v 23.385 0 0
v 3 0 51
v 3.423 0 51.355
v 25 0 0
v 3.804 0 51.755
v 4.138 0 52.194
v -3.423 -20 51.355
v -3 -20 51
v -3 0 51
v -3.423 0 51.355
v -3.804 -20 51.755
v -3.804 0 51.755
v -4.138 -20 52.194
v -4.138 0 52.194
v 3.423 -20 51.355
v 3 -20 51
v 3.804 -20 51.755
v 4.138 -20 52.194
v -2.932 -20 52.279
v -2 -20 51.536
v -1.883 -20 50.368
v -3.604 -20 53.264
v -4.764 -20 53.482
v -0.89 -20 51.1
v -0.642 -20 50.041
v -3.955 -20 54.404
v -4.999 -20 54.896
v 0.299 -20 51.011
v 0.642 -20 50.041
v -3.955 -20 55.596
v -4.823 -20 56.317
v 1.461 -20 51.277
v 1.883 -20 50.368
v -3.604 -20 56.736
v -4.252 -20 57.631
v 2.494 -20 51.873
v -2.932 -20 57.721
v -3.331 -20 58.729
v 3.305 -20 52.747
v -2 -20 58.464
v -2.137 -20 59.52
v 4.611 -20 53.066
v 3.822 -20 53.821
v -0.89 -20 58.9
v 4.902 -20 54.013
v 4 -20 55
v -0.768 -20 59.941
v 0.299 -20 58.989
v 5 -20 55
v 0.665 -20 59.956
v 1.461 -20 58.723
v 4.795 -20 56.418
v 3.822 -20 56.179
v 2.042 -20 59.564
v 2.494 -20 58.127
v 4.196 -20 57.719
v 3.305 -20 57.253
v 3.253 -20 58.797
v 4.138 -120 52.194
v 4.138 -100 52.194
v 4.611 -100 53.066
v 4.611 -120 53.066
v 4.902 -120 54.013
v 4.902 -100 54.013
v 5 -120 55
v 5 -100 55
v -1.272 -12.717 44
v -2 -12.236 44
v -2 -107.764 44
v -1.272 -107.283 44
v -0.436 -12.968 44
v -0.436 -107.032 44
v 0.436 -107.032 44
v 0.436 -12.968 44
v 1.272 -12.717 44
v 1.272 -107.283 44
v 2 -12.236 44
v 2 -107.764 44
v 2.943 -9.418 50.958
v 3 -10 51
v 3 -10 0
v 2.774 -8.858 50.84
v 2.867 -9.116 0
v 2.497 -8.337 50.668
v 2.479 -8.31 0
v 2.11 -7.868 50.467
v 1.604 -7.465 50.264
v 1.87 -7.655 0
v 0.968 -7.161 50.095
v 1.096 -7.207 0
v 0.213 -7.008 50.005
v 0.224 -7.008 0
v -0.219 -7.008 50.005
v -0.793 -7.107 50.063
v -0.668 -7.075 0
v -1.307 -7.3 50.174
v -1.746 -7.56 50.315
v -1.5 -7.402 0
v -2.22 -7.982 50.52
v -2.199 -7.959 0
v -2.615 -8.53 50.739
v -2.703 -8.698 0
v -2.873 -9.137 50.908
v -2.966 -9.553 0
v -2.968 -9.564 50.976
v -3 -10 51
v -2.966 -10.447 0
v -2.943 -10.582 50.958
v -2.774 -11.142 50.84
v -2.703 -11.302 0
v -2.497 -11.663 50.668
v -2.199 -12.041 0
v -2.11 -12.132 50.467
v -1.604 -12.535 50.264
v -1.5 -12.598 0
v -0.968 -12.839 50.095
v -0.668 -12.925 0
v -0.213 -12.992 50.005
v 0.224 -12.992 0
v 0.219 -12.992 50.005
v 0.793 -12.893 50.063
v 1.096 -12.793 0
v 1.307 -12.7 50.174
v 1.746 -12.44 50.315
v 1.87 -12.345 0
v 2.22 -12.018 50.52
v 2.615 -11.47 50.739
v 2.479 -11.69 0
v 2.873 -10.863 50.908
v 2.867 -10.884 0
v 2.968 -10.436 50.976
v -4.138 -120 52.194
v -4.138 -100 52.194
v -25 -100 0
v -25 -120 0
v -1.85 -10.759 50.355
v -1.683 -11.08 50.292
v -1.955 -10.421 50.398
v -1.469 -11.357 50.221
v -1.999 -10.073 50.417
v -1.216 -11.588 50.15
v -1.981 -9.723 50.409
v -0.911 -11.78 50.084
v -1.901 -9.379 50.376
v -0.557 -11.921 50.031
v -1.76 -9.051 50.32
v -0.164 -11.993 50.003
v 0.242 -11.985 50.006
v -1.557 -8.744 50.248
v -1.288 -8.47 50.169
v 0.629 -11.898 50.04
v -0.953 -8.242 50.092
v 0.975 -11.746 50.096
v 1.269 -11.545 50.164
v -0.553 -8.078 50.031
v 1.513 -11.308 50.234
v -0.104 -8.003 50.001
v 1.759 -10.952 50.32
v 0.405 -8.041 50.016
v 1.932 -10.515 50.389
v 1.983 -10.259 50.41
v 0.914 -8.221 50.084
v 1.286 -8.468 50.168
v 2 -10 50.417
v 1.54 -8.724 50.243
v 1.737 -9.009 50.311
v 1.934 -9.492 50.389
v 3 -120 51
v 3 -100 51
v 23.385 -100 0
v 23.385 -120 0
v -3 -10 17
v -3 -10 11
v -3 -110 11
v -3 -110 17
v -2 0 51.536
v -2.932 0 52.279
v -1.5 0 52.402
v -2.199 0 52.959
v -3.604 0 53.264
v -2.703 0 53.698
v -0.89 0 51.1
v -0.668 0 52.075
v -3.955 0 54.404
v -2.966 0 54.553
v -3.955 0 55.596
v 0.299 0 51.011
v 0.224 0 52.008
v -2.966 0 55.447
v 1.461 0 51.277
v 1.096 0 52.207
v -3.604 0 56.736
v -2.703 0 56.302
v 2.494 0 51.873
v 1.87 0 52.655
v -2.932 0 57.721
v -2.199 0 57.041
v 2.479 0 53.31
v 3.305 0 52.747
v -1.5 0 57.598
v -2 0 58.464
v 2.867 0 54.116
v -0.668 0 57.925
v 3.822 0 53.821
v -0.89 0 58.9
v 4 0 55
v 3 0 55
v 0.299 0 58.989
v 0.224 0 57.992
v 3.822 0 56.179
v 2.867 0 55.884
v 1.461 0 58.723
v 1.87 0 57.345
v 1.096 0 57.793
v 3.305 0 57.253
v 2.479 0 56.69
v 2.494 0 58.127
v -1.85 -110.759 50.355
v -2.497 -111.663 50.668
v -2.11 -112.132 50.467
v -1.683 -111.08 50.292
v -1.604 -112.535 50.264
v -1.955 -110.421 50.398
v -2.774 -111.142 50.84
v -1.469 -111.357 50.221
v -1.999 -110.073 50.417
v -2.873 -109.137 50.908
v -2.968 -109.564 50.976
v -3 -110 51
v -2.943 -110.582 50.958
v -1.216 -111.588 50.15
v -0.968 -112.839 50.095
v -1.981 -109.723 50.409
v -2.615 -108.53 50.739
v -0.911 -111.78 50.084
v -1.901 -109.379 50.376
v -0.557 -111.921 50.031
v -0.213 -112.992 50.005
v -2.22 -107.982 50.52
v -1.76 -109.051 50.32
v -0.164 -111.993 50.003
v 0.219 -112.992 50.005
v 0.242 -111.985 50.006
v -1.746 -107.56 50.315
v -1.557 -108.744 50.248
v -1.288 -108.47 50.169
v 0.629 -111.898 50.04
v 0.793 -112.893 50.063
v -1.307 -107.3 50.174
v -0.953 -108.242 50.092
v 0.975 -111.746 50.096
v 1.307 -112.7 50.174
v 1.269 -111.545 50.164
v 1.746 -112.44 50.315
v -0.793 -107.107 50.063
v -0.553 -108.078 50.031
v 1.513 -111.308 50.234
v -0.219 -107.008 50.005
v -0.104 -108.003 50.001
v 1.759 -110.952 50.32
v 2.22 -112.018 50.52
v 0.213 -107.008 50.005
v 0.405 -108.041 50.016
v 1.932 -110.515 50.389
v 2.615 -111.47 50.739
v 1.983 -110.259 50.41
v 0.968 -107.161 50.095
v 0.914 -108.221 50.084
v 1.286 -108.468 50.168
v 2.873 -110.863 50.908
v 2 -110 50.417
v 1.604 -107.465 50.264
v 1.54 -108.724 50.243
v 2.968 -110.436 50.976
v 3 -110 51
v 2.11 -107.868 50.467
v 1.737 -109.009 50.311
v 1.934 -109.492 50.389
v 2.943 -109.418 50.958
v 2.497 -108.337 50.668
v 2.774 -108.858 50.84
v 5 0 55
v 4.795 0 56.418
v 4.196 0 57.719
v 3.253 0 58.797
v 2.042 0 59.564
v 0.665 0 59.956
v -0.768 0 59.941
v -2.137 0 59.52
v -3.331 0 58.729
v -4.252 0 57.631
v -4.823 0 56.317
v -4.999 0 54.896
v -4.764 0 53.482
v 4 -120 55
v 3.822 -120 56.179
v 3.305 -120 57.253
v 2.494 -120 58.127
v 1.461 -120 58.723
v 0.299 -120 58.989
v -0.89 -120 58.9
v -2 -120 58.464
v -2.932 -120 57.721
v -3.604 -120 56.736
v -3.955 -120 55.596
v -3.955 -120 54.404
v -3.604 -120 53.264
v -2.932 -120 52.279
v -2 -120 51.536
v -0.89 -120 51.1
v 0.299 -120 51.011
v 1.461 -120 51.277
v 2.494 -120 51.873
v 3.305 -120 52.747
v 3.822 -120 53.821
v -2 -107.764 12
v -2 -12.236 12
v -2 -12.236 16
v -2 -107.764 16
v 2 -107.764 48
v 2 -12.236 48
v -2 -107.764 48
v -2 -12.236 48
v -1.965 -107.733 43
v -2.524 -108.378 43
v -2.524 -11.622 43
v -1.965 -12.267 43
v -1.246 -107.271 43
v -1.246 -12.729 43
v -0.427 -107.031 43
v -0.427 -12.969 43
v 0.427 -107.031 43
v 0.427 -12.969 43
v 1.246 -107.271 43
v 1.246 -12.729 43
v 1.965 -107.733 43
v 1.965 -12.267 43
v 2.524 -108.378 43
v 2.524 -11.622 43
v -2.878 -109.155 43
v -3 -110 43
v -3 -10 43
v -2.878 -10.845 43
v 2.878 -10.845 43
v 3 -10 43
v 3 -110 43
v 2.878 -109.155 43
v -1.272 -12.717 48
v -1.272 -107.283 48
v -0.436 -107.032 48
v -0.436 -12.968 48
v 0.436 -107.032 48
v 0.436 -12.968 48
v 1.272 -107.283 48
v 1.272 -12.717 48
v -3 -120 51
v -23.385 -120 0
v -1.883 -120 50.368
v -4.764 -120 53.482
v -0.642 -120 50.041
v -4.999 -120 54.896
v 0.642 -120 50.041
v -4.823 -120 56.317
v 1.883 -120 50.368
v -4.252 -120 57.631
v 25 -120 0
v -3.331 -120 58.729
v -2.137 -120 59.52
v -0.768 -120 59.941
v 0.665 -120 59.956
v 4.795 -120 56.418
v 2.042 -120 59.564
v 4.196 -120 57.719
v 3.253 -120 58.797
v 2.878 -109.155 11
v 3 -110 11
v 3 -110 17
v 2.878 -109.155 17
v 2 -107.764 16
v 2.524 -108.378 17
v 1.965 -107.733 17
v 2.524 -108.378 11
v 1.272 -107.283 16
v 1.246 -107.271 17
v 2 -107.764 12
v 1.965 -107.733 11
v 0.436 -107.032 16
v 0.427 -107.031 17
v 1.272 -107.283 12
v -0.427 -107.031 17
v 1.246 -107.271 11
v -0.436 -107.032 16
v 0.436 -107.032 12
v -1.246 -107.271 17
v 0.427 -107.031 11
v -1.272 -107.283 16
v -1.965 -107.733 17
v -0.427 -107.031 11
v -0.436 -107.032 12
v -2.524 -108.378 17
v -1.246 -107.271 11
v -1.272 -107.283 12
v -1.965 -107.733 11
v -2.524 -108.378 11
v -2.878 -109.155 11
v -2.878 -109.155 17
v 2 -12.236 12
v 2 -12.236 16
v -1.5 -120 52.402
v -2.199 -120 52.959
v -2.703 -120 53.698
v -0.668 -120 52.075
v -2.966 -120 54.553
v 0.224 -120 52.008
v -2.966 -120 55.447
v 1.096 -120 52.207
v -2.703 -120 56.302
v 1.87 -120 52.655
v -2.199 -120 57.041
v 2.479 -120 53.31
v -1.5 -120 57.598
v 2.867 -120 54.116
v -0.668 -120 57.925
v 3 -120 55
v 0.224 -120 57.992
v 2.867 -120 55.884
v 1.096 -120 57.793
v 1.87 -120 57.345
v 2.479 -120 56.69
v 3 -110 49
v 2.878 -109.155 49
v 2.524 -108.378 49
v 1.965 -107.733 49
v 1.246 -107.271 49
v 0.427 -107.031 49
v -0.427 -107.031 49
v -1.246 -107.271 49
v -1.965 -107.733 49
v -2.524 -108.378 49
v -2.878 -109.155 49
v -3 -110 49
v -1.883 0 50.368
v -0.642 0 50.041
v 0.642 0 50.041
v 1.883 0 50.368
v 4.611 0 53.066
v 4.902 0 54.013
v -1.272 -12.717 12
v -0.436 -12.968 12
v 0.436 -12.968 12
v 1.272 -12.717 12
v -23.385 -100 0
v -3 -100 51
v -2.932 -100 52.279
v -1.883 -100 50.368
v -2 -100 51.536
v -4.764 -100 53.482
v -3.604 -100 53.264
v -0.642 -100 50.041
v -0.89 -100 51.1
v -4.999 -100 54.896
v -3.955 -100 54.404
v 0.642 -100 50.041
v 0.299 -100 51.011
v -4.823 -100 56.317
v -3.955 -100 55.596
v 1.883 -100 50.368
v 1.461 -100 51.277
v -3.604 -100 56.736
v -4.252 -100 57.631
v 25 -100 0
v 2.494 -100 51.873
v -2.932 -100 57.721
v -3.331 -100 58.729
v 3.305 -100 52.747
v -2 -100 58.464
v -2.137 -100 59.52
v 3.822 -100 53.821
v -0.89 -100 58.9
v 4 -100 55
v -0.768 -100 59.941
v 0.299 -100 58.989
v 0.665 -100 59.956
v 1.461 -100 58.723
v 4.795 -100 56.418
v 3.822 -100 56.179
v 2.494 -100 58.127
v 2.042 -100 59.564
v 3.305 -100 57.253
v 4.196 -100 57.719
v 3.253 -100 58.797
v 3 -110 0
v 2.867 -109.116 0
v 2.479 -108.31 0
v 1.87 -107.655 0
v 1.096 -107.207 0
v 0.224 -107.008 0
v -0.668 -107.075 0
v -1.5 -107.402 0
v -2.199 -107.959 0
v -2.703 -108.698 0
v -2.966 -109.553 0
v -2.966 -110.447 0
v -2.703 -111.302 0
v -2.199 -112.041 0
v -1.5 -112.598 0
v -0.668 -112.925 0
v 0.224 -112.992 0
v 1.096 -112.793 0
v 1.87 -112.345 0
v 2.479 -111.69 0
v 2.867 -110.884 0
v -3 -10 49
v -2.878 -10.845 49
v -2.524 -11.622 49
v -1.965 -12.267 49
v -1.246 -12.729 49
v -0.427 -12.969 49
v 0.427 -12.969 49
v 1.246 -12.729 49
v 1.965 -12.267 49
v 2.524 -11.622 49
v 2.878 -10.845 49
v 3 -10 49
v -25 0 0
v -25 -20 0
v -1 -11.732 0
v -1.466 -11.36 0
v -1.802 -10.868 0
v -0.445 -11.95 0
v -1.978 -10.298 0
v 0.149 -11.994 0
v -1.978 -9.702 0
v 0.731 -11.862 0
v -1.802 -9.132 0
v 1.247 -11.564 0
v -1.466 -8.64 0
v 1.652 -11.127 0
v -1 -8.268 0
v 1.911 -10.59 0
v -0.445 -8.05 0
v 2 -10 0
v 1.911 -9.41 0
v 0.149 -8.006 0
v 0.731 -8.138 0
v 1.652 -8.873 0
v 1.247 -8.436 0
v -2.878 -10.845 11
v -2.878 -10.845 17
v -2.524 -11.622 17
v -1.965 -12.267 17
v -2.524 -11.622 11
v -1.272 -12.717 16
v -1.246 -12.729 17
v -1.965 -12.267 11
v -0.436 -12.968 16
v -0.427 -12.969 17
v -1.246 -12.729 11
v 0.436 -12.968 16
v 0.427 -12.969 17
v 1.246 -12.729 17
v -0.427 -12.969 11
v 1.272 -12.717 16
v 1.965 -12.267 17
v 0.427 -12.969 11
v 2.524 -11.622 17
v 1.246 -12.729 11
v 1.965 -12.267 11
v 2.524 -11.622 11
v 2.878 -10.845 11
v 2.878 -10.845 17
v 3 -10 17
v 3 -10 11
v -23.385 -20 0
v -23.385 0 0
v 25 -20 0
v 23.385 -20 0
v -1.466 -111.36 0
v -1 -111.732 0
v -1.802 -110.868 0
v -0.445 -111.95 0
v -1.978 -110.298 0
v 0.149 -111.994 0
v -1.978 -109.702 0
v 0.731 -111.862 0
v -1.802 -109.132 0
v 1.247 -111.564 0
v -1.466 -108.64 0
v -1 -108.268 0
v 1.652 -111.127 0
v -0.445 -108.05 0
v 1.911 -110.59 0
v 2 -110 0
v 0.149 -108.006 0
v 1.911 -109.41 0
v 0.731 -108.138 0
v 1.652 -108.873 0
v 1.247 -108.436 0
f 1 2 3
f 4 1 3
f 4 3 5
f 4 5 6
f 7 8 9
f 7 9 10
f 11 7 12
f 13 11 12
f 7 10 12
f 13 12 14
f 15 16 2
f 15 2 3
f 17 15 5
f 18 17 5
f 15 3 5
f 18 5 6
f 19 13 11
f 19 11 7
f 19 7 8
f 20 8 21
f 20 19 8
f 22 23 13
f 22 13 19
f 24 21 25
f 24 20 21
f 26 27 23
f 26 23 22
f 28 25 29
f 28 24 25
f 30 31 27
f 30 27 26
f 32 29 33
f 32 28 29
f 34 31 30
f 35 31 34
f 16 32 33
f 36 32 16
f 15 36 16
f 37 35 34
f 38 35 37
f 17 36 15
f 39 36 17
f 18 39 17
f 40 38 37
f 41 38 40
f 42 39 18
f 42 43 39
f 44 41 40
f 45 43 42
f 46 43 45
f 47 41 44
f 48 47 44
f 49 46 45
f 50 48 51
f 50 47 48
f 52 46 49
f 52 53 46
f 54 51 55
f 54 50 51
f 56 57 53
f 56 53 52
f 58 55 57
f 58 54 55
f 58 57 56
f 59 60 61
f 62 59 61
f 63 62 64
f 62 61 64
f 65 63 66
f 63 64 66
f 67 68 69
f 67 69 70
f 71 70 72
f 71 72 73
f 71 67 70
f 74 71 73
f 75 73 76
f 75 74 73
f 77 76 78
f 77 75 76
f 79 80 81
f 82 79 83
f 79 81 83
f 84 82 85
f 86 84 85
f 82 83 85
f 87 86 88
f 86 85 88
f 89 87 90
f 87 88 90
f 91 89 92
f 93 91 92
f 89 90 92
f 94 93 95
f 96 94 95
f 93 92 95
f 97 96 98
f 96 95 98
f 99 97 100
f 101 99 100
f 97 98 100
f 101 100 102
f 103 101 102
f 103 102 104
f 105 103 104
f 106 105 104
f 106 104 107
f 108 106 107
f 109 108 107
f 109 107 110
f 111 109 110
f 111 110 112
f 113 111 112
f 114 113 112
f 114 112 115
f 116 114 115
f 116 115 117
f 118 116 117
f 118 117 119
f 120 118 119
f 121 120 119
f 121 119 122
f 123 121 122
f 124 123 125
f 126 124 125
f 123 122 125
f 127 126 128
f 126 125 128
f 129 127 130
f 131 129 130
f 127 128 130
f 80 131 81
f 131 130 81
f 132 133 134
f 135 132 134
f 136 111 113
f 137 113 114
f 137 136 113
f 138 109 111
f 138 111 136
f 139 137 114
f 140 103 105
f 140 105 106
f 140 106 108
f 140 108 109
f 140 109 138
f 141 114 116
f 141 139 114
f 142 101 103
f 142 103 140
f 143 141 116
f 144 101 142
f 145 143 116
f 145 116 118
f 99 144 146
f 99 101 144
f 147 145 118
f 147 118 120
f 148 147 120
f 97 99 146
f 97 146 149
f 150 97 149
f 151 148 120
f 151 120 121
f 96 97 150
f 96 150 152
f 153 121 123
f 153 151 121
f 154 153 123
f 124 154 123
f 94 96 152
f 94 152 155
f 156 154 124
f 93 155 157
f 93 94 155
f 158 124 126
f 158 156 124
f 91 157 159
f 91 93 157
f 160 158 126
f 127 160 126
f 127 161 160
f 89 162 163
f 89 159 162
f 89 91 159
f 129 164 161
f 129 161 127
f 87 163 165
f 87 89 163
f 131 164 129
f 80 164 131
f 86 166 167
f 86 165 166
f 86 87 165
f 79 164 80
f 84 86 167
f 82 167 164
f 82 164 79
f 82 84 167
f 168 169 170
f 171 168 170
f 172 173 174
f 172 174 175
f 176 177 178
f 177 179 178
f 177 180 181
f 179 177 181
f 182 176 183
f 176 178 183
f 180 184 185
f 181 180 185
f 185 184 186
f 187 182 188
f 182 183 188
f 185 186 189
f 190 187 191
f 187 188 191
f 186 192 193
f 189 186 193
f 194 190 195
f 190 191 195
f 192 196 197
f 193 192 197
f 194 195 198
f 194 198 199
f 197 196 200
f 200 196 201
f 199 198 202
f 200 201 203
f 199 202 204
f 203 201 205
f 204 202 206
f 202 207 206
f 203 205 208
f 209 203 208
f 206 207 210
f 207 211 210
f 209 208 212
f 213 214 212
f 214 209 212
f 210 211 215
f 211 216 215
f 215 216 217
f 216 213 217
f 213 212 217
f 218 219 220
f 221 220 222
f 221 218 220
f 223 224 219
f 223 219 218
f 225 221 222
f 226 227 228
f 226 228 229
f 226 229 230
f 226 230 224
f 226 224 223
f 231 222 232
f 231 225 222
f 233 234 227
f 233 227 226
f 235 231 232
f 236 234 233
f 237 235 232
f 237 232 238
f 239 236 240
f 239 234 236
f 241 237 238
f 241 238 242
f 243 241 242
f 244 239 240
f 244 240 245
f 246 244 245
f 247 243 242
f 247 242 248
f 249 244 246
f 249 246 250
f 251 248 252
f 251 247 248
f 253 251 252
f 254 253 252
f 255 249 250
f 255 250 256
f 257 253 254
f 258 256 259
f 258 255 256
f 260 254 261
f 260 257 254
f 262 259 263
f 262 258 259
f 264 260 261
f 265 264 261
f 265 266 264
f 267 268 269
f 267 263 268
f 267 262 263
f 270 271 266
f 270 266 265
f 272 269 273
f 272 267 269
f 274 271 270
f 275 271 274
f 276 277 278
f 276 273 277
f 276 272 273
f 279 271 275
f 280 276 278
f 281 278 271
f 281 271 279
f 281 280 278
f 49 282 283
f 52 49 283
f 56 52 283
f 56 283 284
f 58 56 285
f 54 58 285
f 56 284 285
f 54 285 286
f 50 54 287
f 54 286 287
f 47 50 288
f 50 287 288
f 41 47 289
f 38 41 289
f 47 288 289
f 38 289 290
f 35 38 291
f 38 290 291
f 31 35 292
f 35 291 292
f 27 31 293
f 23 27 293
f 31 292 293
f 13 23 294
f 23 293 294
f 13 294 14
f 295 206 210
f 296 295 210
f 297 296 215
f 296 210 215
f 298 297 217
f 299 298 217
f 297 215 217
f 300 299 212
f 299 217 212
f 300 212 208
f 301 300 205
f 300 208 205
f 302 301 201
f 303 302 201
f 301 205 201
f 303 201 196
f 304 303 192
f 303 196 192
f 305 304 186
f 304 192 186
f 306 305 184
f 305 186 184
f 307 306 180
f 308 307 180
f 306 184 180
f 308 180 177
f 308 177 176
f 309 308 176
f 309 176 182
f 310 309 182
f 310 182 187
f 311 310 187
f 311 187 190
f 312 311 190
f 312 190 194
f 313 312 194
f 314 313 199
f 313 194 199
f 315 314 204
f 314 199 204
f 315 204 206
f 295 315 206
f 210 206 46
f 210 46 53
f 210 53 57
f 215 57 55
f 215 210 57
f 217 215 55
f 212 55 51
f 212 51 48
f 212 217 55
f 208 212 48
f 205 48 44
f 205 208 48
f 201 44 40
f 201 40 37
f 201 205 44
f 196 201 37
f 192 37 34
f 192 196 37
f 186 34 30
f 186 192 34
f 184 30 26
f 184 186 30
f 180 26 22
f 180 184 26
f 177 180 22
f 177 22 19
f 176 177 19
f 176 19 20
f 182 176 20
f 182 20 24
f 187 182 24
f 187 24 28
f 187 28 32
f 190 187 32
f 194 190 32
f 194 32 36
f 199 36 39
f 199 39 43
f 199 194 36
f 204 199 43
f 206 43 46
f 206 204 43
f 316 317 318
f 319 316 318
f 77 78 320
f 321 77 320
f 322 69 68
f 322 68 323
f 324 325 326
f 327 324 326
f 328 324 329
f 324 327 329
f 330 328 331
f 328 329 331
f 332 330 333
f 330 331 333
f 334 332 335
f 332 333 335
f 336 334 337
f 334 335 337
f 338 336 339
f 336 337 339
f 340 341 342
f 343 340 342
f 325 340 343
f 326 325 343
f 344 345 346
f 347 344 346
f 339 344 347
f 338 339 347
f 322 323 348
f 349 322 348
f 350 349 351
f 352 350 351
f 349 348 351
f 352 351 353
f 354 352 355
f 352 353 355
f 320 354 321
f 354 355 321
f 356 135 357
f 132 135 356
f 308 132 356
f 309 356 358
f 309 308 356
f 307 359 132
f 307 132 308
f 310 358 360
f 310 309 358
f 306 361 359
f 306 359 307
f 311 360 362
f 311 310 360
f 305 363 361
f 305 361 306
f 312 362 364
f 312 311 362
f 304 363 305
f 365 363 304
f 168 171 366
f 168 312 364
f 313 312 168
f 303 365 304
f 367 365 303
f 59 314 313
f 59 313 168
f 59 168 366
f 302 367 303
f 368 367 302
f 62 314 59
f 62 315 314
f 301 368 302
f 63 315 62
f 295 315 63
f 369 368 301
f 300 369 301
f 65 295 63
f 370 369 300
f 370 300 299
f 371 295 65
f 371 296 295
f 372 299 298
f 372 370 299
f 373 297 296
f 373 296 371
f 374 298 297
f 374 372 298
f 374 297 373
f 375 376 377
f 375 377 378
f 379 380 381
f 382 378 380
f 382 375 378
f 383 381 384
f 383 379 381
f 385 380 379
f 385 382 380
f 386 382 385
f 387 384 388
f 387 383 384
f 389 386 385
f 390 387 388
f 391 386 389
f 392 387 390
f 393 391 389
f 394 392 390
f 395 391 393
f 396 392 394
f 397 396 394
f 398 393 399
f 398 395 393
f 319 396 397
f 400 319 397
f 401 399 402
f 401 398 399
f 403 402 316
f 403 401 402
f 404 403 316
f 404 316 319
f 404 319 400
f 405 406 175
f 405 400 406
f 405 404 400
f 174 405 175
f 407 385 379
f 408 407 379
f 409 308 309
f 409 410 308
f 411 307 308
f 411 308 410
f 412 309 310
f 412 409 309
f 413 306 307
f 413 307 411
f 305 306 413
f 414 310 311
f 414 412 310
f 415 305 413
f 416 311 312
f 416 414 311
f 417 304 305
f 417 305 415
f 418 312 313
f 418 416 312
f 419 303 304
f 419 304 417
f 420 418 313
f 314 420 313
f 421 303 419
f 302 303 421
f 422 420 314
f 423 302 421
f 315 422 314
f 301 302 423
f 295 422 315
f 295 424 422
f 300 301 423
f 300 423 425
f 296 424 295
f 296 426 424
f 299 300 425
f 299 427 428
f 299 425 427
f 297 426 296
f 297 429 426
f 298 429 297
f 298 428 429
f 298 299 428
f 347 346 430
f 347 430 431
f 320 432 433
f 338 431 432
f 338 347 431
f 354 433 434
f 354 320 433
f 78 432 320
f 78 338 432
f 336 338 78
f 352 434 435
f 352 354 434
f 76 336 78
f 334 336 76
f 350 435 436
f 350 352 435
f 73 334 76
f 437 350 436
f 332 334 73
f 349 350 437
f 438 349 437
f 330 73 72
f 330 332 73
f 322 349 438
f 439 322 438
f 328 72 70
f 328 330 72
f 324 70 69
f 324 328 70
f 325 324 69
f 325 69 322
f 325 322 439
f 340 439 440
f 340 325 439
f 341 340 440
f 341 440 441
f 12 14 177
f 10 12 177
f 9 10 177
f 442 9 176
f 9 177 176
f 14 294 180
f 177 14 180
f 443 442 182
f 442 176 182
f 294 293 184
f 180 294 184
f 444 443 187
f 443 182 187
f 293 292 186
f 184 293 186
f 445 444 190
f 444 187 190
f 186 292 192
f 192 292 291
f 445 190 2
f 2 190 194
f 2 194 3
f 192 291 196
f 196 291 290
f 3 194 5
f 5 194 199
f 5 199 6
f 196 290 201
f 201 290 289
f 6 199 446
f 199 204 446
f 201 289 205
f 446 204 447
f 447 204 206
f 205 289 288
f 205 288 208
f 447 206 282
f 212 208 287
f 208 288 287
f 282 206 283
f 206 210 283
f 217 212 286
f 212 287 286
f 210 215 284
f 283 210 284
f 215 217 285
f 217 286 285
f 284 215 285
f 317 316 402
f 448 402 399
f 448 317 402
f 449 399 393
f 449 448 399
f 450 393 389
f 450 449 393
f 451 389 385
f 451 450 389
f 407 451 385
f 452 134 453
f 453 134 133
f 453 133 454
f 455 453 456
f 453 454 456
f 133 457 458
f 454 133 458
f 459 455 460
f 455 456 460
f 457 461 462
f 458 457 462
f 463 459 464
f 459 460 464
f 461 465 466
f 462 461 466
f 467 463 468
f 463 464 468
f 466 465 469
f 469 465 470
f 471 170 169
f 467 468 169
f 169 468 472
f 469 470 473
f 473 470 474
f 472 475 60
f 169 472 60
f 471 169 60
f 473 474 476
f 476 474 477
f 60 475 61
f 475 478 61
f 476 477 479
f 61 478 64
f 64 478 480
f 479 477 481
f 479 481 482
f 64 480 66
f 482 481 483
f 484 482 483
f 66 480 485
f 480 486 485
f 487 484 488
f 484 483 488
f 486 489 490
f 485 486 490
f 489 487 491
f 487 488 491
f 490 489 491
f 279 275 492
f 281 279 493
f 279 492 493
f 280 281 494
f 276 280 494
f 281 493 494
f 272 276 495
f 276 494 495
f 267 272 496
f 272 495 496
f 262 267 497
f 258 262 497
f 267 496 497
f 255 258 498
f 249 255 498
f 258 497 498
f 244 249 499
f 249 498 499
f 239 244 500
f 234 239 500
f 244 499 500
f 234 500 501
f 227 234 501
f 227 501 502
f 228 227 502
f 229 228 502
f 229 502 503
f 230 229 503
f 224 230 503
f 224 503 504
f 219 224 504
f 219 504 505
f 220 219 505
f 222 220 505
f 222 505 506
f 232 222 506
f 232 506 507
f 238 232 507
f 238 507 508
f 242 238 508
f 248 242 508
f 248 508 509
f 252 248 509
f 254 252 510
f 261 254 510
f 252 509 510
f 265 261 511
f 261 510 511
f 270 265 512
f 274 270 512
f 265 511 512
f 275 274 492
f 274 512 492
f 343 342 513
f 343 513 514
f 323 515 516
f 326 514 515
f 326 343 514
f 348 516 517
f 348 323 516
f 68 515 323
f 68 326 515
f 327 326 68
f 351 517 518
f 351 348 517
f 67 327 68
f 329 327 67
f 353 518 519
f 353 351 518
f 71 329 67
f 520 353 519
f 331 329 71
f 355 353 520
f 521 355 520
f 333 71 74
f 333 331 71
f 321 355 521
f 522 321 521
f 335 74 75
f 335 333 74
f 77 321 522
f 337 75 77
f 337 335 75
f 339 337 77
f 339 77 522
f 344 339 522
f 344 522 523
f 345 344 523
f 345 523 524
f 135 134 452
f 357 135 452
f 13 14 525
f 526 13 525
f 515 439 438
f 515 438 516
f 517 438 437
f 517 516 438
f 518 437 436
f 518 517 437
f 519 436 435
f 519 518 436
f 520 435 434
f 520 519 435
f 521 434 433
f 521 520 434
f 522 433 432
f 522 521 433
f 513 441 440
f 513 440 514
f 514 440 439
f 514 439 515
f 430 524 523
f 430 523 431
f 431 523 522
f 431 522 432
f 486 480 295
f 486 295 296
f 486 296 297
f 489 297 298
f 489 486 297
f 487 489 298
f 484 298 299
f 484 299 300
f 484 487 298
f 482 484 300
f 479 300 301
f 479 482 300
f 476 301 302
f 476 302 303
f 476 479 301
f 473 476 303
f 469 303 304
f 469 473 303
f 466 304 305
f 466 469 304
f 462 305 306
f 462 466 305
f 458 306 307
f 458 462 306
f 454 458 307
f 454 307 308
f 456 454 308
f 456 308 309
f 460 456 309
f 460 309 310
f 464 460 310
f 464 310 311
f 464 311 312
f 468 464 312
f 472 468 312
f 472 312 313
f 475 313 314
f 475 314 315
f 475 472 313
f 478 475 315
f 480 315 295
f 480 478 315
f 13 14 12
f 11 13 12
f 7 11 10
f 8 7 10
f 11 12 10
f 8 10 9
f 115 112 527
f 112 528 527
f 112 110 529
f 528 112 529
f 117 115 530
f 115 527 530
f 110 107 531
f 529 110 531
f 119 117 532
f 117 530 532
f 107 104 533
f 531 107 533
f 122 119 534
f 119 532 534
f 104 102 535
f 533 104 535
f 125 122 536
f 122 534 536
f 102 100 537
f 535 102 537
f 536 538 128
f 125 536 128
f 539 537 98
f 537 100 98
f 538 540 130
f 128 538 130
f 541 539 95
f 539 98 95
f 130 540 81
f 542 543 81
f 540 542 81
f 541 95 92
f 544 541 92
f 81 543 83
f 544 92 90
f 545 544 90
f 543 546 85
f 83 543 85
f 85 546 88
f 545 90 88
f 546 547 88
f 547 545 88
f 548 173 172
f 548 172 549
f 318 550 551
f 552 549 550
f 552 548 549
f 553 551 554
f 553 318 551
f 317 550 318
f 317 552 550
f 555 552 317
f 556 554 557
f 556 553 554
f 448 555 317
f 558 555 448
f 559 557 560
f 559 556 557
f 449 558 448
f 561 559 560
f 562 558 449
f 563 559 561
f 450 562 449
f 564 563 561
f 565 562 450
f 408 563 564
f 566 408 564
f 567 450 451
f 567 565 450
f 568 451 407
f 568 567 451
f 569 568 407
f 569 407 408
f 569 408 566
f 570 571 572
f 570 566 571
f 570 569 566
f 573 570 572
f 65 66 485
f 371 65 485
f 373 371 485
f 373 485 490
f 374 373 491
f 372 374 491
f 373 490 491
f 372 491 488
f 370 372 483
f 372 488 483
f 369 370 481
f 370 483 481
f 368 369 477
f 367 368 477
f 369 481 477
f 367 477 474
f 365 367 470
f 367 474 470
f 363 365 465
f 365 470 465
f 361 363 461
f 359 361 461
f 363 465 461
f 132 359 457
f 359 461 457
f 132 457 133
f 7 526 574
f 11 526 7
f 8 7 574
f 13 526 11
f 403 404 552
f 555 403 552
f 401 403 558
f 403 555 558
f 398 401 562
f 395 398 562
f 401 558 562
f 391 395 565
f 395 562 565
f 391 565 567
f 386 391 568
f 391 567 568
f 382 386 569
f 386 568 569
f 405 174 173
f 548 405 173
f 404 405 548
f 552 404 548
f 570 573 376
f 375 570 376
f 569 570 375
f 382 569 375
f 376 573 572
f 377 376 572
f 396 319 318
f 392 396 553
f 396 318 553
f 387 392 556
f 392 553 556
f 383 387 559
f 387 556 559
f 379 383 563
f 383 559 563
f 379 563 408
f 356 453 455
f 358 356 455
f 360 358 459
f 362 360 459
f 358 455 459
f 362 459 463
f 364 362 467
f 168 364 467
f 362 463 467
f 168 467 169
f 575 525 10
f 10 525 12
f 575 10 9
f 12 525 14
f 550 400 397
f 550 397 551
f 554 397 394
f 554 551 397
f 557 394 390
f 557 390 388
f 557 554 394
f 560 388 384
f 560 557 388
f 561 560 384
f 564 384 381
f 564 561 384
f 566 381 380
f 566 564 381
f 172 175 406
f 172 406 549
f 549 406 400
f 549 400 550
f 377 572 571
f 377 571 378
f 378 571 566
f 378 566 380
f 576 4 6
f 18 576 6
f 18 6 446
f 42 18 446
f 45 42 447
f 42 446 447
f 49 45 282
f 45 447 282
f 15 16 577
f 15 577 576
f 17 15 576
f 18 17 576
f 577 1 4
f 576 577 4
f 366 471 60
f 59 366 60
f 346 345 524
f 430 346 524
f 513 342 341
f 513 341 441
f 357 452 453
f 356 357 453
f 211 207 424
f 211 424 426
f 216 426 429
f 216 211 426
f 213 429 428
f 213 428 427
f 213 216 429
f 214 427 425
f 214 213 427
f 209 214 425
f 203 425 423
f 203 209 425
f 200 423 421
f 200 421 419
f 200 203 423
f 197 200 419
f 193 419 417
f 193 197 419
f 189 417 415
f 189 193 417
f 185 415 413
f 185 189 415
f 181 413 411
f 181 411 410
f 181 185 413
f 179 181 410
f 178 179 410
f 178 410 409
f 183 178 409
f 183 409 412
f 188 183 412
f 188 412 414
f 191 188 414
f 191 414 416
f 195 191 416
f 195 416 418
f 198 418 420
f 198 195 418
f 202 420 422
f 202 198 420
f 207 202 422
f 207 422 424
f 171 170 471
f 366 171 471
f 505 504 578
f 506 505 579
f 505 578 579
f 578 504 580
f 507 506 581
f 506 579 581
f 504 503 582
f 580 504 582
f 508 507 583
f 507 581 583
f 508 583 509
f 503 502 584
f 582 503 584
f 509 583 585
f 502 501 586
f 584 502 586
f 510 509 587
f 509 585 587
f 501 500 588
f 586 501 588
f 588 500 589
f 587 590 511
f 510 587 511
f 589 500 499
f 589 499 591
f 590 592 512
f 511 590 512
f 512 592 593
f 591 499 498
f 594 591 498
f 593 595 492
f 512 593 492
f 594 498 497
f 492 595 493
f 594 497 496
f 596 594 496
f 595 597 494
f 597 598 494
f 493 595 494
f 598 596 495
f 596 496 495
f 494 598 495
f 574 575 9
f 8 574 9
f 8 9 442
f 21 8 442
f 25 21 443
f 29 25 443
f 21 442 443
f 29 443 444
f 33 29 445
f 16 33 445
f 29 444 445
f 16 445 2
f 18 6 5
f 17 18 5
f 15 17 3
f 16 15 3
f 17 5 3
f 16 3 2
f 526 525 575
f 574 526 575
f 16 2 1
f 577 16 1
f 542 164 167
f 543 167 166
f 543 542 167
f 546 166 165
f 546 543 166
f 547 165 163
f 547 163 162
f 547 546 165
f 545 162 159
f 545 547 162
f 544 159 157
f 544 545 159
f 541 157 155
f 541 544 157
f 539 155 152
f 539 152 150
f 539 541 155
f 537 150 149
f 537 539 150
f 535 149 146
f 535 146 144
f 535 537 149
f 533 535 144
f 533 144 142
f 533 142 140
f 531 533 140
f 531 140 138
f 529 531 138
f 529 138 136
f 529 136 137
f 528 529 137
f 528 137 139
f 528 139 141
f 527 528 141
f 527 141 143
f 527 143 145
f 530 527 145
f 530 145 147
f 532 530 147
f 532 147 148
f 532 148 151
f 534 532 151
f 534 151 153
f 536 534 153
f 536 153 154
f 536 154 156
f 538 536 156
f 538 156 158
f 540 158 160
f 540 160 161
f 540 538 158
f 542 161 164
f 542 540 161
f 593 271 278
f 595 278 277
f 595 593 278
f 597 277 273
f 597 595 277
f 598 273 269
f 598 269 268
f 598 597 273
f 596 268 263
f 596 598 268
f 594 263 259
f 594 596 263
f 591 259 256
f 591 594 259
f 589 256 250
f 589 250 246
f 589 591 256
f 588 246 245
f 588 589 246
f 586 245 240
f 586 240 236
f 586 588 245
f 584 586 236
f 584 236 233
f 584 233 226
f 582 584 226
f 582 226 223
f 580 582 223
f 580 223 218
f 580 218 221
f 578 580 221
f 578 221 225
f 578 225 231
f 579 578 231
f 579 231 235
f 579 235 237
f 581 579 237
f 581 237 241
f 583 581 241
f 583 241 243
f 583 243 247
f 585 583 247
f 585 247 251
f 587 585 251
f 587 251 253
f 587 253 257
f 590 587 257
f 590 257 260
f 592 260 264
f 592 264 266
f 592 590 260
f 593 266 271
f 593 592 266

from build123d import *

# Parameters (mm, degrees)
F2_DEPTH = 20
F3_START = 10
F1_W     = 6
F1_H     = 6
F1_W_2   = 4
F1_H_2   = 4
F3_DEPTH = 100
F0_R     = 3
F0_R_2   = 2
F4_DEPTH = 50
F5_DEPTH = 55
F1_R     = 4
F1_R_2   = 3
F6_DEPTH = 120
F7_DEPTH = 20
F8_START = 100
F8_DEPTH = 20
F9_DEPTH = 120


with BuildPart() as f2:
    # F1 (on Front) → F2 (new body)
    with BuildSketch(Plane.XZ):
        with BuildLine():
            ThreePointArc((-3, 51), (-3.6186841703, 51.5496196043), (-4.1382378442, 52.1937591792))
            Line((-4.1382378442, 52.1937591792), (-25, 0))
            Line((-25, 0), (-23.3846185191, 0))
            Line((-23.3846185191, 0), (-3, 51))
        make_face()
    extrude(amount=F2_DEPTH)


with BuildPart() as f2b:
    # F1 (on Front) → F2, piece 2 (new body)
    with BuildSketch(Plane.XZ):
        with BuildLine():
            Line((25, 0), (4.1382378442, 52.1937591792))
            ThreePointArc((4.1382378442, 52.1937591792), (3.6186841703, 51.5496196043), (3, 51))
            Line((3, 51), (23.3846185191, 0))
            Line((23.3846185191, 0), (25, 0))
        make_face()
    extrude(amount=F2_DEPTH)


with BuildPart() as f3:
    # F1 (on Front) → F3 (new body)
    with BuildSketch(Plane.XZ.offset(F3_START)):
        with Locations((0, 46)):
            Rectangle(F1_W, F1_H)
        with Locations((0, 46)):
            Rectangle(F1_W_2, F1_H_2, mode=Mode.SUBTRACT)
    extrude(amount=F3_DEPTH)


with BuildPart() as f3b:
    # F1 (on Front) → F3, piece 2 (new body)
    with BuildSketch(Plane.XZ.offset(F3_START)):
        with Locations((-2.61e-08, 14)):
            Rectangle(F1_W, F1_H)
        with Locations((-2.61e-08, 14)):
            Rectangle(F1_W_2, F1_H_2, mode=Mode.SUBTRACT)
    extrude(amount=F3_DEPTH)


with BuildPart() as f4_tool:
    # F0 (on Top) → F4 (new body)
    with BuildSketch(Plane.XY):
        with Locations((0, -10)):
            Circle(F0_R)
        with Locations((0, -10)):
            Circle(F0_R_2, mode=Mode.SUBTRACT)
        with Locations((0, -110)):
            Circle(F0_R)
        with Locations((0, -110)):
            Circle(F0_R_2, mode=Mode.SUBTRACT)
        with Locations((0, -10)):
            Circle(F0_R_2)
        with Locations((0, -110)):
            Circle(F0_R_2)
    extrude(amount=F4_DEPTH)


with BuildPart() as f3_1:
    add(f3.part)

    # F4: cut by f4_tool
    add(f4_tool.part, mode=Mode.SUBTRACT)


with BuildPart() as f3b_1:
    add(f3b.part)

    # F4: cut by f4_tool
    add(f4_tool.part, mode=Mode.SUBTRACT)


with BuildPart() as f5:
    # F0 (on Top) → F5 (new body)
    with BuildSketch(Plane.XY):
        with Locations((0, -10)):
            Circle(F0_R)
        with Locations((0, -10)):
            Circle(F0_R_2, mode=Mode.SUBTRACT)
    extrude(amount=F5_DEPTH)


with BuildPart() as f5b:
    # F0 (on Top) → F5, piece 2 (new body)
    with BuildSketch(Plane.XY):
        with Locations((0, -110)):
            Circle(F0_R)
        with Locations((0, -110)):
            Circle(F0_R_2, mode=Mode.SUBTRACT)
    extrude(amount=F5_DEPTH)


with BuildPart() as f6_tool:
    # F1 (on Front) → F6 (new body)
    with BuildSketch(Plane.XZ):
        with BuildLine():
            ThreePointArc((4.1382378442, 52.1937591792), (4.7797065402, 53.5322107135), (5, 55))
            ThreePointArc((5, 55), (-1.4677892865, 59.7797065402), (-4.1382378442, 52.1937591792))
            ThreePointArc((-4.1382378442, 52.1937591792), (-3.6186841703, 51.5496196043), (-3, 51))
            ThreePointArc((-3, 51), (0, 50), (3, 51))
            ThreePointArc((3, 51), (3.6186841703, 51.5496196043), (4.1382378442, 52.1937591792))
        make_face()
        with Locations((0, 55)):
            Circle(F1_R, mode=Mode.SUBTRACT)
        with Locations((0, 55)):
            Circle(F1_R)
        with Locations((0, 55)):
            Circle(F1_R_2, mode=Mode.SUBTRACT)
        with Locations((0, 55)):
            Circle(F1_R_2)
    extrude(amount=F6_DEPTH)


with BuildPart() as f5_1:
    add(f5.part)

    # F6: cut by f6_tool
    add(f6_tool.part, mode=Mode.SUBTRACT)


with BuildPart() as f5b_1:
    add(f5b.part)

    # F6: cut by f6_tool
    add(f6_tool.part, mode=Mode.SUBTRACT)


with BuildPart() as f7:
    # F1 (on Front) → F7 (new body)
    with BuildSketch(Plane.XZ):
        with BuildLine():
            ThreePointArc((4.1382378442, 52.1937591792), (4.7797065402, 53.5322107135), (5, 55))
            ThreePointArc((5, 55), (-1.4677892865, 59.7797065402), (-4.1382378442, 52.1937591792))
            ThreePointArc((-4.1382378442, 52.1937591792), (-3.6186841703, 51.5496196043), (-3, 51))
            ThreePointArc((-3, 51), (0, 50), (3, 51))
            ThreePointArc((3, 51), (3.6186841703, 51.5496196043), (4.1382378442, 52.1937591792))
        make_face()
        with Locations((0, 55)):
            Circle(F1_R, mode=Mode.SUBTRACT)
    extrude(amount=F7_DEPTH)


with BuildPart() as f8:
    # F1 (on Front) → F8 (new body)
    with BuildSketch(Plane.XZ.offset(F8_START)):
        with BuildLine():
            ThreePointArc((4.1382378442, 52.1937591792), (4.7797065402, 53.5322107135), (5, 55))
            ThreePointArc((5, 55), (-1.4677892865, 59.7797065402), (-4.1382378442, 52.1937591792))
            ThreePointArc((-4.1382378442, 52.1937591792), (-3.6186841703, 51.5496196043), (-3, 51))
            ThreePointArc((-3, 51), (0, 50), (3, 51))
            ThreePointArc((3, 51), (3.6186841703, 51.5496196043), (4.1382378442, 52.1937591792))
        make_face()
        with Locations((0, 55)):
            Circle(F1_R, mode=Mode.SUBTRACT)
        with BuildLine():
            ThreePointArc((-3, 51), (-3.6186841703, 51.5496196043), (-4.1382378442, 52.1937591792))
            Line((-4.1382378442, 52.1937591792), (-25, 0))
            Line((-25, 0), (-23.3846185191, 0))
            Line((-23.3846185191, 0), (-3, 51))
        make_face()
        with BuildLine():
            Line((25, 0), (4.1382378442, 52.1937591792))
            ThreePointArc((4.1382378442, 52.1937591792), (3.6186841703, 51.5496196043), (3, 51))
            Line((3, 51), (23.3846185191, 0))
            Line((23.3846185191, 0), (25, 0))
        make_face()
    extrude(amount=F8_DEPTH)


with BuildPart() as f9:
    # F1 (on Front) → F9 (new body)
    with BuildSketch(Plane.XZ):
        with Locations((0, 55)):
            Circle(F1_R)
        with Locations((0, 55)):
            Circle(F1_R_2, mode=Mode.SUBTRACT)
    extrude(amount=F9_DEPTH)


solid = Compound([f2.part, f2b.part, f3_1.part, f3b_1.part, f5_1.part, f5b_1.part, f7.part, f8.part, f9.part])
